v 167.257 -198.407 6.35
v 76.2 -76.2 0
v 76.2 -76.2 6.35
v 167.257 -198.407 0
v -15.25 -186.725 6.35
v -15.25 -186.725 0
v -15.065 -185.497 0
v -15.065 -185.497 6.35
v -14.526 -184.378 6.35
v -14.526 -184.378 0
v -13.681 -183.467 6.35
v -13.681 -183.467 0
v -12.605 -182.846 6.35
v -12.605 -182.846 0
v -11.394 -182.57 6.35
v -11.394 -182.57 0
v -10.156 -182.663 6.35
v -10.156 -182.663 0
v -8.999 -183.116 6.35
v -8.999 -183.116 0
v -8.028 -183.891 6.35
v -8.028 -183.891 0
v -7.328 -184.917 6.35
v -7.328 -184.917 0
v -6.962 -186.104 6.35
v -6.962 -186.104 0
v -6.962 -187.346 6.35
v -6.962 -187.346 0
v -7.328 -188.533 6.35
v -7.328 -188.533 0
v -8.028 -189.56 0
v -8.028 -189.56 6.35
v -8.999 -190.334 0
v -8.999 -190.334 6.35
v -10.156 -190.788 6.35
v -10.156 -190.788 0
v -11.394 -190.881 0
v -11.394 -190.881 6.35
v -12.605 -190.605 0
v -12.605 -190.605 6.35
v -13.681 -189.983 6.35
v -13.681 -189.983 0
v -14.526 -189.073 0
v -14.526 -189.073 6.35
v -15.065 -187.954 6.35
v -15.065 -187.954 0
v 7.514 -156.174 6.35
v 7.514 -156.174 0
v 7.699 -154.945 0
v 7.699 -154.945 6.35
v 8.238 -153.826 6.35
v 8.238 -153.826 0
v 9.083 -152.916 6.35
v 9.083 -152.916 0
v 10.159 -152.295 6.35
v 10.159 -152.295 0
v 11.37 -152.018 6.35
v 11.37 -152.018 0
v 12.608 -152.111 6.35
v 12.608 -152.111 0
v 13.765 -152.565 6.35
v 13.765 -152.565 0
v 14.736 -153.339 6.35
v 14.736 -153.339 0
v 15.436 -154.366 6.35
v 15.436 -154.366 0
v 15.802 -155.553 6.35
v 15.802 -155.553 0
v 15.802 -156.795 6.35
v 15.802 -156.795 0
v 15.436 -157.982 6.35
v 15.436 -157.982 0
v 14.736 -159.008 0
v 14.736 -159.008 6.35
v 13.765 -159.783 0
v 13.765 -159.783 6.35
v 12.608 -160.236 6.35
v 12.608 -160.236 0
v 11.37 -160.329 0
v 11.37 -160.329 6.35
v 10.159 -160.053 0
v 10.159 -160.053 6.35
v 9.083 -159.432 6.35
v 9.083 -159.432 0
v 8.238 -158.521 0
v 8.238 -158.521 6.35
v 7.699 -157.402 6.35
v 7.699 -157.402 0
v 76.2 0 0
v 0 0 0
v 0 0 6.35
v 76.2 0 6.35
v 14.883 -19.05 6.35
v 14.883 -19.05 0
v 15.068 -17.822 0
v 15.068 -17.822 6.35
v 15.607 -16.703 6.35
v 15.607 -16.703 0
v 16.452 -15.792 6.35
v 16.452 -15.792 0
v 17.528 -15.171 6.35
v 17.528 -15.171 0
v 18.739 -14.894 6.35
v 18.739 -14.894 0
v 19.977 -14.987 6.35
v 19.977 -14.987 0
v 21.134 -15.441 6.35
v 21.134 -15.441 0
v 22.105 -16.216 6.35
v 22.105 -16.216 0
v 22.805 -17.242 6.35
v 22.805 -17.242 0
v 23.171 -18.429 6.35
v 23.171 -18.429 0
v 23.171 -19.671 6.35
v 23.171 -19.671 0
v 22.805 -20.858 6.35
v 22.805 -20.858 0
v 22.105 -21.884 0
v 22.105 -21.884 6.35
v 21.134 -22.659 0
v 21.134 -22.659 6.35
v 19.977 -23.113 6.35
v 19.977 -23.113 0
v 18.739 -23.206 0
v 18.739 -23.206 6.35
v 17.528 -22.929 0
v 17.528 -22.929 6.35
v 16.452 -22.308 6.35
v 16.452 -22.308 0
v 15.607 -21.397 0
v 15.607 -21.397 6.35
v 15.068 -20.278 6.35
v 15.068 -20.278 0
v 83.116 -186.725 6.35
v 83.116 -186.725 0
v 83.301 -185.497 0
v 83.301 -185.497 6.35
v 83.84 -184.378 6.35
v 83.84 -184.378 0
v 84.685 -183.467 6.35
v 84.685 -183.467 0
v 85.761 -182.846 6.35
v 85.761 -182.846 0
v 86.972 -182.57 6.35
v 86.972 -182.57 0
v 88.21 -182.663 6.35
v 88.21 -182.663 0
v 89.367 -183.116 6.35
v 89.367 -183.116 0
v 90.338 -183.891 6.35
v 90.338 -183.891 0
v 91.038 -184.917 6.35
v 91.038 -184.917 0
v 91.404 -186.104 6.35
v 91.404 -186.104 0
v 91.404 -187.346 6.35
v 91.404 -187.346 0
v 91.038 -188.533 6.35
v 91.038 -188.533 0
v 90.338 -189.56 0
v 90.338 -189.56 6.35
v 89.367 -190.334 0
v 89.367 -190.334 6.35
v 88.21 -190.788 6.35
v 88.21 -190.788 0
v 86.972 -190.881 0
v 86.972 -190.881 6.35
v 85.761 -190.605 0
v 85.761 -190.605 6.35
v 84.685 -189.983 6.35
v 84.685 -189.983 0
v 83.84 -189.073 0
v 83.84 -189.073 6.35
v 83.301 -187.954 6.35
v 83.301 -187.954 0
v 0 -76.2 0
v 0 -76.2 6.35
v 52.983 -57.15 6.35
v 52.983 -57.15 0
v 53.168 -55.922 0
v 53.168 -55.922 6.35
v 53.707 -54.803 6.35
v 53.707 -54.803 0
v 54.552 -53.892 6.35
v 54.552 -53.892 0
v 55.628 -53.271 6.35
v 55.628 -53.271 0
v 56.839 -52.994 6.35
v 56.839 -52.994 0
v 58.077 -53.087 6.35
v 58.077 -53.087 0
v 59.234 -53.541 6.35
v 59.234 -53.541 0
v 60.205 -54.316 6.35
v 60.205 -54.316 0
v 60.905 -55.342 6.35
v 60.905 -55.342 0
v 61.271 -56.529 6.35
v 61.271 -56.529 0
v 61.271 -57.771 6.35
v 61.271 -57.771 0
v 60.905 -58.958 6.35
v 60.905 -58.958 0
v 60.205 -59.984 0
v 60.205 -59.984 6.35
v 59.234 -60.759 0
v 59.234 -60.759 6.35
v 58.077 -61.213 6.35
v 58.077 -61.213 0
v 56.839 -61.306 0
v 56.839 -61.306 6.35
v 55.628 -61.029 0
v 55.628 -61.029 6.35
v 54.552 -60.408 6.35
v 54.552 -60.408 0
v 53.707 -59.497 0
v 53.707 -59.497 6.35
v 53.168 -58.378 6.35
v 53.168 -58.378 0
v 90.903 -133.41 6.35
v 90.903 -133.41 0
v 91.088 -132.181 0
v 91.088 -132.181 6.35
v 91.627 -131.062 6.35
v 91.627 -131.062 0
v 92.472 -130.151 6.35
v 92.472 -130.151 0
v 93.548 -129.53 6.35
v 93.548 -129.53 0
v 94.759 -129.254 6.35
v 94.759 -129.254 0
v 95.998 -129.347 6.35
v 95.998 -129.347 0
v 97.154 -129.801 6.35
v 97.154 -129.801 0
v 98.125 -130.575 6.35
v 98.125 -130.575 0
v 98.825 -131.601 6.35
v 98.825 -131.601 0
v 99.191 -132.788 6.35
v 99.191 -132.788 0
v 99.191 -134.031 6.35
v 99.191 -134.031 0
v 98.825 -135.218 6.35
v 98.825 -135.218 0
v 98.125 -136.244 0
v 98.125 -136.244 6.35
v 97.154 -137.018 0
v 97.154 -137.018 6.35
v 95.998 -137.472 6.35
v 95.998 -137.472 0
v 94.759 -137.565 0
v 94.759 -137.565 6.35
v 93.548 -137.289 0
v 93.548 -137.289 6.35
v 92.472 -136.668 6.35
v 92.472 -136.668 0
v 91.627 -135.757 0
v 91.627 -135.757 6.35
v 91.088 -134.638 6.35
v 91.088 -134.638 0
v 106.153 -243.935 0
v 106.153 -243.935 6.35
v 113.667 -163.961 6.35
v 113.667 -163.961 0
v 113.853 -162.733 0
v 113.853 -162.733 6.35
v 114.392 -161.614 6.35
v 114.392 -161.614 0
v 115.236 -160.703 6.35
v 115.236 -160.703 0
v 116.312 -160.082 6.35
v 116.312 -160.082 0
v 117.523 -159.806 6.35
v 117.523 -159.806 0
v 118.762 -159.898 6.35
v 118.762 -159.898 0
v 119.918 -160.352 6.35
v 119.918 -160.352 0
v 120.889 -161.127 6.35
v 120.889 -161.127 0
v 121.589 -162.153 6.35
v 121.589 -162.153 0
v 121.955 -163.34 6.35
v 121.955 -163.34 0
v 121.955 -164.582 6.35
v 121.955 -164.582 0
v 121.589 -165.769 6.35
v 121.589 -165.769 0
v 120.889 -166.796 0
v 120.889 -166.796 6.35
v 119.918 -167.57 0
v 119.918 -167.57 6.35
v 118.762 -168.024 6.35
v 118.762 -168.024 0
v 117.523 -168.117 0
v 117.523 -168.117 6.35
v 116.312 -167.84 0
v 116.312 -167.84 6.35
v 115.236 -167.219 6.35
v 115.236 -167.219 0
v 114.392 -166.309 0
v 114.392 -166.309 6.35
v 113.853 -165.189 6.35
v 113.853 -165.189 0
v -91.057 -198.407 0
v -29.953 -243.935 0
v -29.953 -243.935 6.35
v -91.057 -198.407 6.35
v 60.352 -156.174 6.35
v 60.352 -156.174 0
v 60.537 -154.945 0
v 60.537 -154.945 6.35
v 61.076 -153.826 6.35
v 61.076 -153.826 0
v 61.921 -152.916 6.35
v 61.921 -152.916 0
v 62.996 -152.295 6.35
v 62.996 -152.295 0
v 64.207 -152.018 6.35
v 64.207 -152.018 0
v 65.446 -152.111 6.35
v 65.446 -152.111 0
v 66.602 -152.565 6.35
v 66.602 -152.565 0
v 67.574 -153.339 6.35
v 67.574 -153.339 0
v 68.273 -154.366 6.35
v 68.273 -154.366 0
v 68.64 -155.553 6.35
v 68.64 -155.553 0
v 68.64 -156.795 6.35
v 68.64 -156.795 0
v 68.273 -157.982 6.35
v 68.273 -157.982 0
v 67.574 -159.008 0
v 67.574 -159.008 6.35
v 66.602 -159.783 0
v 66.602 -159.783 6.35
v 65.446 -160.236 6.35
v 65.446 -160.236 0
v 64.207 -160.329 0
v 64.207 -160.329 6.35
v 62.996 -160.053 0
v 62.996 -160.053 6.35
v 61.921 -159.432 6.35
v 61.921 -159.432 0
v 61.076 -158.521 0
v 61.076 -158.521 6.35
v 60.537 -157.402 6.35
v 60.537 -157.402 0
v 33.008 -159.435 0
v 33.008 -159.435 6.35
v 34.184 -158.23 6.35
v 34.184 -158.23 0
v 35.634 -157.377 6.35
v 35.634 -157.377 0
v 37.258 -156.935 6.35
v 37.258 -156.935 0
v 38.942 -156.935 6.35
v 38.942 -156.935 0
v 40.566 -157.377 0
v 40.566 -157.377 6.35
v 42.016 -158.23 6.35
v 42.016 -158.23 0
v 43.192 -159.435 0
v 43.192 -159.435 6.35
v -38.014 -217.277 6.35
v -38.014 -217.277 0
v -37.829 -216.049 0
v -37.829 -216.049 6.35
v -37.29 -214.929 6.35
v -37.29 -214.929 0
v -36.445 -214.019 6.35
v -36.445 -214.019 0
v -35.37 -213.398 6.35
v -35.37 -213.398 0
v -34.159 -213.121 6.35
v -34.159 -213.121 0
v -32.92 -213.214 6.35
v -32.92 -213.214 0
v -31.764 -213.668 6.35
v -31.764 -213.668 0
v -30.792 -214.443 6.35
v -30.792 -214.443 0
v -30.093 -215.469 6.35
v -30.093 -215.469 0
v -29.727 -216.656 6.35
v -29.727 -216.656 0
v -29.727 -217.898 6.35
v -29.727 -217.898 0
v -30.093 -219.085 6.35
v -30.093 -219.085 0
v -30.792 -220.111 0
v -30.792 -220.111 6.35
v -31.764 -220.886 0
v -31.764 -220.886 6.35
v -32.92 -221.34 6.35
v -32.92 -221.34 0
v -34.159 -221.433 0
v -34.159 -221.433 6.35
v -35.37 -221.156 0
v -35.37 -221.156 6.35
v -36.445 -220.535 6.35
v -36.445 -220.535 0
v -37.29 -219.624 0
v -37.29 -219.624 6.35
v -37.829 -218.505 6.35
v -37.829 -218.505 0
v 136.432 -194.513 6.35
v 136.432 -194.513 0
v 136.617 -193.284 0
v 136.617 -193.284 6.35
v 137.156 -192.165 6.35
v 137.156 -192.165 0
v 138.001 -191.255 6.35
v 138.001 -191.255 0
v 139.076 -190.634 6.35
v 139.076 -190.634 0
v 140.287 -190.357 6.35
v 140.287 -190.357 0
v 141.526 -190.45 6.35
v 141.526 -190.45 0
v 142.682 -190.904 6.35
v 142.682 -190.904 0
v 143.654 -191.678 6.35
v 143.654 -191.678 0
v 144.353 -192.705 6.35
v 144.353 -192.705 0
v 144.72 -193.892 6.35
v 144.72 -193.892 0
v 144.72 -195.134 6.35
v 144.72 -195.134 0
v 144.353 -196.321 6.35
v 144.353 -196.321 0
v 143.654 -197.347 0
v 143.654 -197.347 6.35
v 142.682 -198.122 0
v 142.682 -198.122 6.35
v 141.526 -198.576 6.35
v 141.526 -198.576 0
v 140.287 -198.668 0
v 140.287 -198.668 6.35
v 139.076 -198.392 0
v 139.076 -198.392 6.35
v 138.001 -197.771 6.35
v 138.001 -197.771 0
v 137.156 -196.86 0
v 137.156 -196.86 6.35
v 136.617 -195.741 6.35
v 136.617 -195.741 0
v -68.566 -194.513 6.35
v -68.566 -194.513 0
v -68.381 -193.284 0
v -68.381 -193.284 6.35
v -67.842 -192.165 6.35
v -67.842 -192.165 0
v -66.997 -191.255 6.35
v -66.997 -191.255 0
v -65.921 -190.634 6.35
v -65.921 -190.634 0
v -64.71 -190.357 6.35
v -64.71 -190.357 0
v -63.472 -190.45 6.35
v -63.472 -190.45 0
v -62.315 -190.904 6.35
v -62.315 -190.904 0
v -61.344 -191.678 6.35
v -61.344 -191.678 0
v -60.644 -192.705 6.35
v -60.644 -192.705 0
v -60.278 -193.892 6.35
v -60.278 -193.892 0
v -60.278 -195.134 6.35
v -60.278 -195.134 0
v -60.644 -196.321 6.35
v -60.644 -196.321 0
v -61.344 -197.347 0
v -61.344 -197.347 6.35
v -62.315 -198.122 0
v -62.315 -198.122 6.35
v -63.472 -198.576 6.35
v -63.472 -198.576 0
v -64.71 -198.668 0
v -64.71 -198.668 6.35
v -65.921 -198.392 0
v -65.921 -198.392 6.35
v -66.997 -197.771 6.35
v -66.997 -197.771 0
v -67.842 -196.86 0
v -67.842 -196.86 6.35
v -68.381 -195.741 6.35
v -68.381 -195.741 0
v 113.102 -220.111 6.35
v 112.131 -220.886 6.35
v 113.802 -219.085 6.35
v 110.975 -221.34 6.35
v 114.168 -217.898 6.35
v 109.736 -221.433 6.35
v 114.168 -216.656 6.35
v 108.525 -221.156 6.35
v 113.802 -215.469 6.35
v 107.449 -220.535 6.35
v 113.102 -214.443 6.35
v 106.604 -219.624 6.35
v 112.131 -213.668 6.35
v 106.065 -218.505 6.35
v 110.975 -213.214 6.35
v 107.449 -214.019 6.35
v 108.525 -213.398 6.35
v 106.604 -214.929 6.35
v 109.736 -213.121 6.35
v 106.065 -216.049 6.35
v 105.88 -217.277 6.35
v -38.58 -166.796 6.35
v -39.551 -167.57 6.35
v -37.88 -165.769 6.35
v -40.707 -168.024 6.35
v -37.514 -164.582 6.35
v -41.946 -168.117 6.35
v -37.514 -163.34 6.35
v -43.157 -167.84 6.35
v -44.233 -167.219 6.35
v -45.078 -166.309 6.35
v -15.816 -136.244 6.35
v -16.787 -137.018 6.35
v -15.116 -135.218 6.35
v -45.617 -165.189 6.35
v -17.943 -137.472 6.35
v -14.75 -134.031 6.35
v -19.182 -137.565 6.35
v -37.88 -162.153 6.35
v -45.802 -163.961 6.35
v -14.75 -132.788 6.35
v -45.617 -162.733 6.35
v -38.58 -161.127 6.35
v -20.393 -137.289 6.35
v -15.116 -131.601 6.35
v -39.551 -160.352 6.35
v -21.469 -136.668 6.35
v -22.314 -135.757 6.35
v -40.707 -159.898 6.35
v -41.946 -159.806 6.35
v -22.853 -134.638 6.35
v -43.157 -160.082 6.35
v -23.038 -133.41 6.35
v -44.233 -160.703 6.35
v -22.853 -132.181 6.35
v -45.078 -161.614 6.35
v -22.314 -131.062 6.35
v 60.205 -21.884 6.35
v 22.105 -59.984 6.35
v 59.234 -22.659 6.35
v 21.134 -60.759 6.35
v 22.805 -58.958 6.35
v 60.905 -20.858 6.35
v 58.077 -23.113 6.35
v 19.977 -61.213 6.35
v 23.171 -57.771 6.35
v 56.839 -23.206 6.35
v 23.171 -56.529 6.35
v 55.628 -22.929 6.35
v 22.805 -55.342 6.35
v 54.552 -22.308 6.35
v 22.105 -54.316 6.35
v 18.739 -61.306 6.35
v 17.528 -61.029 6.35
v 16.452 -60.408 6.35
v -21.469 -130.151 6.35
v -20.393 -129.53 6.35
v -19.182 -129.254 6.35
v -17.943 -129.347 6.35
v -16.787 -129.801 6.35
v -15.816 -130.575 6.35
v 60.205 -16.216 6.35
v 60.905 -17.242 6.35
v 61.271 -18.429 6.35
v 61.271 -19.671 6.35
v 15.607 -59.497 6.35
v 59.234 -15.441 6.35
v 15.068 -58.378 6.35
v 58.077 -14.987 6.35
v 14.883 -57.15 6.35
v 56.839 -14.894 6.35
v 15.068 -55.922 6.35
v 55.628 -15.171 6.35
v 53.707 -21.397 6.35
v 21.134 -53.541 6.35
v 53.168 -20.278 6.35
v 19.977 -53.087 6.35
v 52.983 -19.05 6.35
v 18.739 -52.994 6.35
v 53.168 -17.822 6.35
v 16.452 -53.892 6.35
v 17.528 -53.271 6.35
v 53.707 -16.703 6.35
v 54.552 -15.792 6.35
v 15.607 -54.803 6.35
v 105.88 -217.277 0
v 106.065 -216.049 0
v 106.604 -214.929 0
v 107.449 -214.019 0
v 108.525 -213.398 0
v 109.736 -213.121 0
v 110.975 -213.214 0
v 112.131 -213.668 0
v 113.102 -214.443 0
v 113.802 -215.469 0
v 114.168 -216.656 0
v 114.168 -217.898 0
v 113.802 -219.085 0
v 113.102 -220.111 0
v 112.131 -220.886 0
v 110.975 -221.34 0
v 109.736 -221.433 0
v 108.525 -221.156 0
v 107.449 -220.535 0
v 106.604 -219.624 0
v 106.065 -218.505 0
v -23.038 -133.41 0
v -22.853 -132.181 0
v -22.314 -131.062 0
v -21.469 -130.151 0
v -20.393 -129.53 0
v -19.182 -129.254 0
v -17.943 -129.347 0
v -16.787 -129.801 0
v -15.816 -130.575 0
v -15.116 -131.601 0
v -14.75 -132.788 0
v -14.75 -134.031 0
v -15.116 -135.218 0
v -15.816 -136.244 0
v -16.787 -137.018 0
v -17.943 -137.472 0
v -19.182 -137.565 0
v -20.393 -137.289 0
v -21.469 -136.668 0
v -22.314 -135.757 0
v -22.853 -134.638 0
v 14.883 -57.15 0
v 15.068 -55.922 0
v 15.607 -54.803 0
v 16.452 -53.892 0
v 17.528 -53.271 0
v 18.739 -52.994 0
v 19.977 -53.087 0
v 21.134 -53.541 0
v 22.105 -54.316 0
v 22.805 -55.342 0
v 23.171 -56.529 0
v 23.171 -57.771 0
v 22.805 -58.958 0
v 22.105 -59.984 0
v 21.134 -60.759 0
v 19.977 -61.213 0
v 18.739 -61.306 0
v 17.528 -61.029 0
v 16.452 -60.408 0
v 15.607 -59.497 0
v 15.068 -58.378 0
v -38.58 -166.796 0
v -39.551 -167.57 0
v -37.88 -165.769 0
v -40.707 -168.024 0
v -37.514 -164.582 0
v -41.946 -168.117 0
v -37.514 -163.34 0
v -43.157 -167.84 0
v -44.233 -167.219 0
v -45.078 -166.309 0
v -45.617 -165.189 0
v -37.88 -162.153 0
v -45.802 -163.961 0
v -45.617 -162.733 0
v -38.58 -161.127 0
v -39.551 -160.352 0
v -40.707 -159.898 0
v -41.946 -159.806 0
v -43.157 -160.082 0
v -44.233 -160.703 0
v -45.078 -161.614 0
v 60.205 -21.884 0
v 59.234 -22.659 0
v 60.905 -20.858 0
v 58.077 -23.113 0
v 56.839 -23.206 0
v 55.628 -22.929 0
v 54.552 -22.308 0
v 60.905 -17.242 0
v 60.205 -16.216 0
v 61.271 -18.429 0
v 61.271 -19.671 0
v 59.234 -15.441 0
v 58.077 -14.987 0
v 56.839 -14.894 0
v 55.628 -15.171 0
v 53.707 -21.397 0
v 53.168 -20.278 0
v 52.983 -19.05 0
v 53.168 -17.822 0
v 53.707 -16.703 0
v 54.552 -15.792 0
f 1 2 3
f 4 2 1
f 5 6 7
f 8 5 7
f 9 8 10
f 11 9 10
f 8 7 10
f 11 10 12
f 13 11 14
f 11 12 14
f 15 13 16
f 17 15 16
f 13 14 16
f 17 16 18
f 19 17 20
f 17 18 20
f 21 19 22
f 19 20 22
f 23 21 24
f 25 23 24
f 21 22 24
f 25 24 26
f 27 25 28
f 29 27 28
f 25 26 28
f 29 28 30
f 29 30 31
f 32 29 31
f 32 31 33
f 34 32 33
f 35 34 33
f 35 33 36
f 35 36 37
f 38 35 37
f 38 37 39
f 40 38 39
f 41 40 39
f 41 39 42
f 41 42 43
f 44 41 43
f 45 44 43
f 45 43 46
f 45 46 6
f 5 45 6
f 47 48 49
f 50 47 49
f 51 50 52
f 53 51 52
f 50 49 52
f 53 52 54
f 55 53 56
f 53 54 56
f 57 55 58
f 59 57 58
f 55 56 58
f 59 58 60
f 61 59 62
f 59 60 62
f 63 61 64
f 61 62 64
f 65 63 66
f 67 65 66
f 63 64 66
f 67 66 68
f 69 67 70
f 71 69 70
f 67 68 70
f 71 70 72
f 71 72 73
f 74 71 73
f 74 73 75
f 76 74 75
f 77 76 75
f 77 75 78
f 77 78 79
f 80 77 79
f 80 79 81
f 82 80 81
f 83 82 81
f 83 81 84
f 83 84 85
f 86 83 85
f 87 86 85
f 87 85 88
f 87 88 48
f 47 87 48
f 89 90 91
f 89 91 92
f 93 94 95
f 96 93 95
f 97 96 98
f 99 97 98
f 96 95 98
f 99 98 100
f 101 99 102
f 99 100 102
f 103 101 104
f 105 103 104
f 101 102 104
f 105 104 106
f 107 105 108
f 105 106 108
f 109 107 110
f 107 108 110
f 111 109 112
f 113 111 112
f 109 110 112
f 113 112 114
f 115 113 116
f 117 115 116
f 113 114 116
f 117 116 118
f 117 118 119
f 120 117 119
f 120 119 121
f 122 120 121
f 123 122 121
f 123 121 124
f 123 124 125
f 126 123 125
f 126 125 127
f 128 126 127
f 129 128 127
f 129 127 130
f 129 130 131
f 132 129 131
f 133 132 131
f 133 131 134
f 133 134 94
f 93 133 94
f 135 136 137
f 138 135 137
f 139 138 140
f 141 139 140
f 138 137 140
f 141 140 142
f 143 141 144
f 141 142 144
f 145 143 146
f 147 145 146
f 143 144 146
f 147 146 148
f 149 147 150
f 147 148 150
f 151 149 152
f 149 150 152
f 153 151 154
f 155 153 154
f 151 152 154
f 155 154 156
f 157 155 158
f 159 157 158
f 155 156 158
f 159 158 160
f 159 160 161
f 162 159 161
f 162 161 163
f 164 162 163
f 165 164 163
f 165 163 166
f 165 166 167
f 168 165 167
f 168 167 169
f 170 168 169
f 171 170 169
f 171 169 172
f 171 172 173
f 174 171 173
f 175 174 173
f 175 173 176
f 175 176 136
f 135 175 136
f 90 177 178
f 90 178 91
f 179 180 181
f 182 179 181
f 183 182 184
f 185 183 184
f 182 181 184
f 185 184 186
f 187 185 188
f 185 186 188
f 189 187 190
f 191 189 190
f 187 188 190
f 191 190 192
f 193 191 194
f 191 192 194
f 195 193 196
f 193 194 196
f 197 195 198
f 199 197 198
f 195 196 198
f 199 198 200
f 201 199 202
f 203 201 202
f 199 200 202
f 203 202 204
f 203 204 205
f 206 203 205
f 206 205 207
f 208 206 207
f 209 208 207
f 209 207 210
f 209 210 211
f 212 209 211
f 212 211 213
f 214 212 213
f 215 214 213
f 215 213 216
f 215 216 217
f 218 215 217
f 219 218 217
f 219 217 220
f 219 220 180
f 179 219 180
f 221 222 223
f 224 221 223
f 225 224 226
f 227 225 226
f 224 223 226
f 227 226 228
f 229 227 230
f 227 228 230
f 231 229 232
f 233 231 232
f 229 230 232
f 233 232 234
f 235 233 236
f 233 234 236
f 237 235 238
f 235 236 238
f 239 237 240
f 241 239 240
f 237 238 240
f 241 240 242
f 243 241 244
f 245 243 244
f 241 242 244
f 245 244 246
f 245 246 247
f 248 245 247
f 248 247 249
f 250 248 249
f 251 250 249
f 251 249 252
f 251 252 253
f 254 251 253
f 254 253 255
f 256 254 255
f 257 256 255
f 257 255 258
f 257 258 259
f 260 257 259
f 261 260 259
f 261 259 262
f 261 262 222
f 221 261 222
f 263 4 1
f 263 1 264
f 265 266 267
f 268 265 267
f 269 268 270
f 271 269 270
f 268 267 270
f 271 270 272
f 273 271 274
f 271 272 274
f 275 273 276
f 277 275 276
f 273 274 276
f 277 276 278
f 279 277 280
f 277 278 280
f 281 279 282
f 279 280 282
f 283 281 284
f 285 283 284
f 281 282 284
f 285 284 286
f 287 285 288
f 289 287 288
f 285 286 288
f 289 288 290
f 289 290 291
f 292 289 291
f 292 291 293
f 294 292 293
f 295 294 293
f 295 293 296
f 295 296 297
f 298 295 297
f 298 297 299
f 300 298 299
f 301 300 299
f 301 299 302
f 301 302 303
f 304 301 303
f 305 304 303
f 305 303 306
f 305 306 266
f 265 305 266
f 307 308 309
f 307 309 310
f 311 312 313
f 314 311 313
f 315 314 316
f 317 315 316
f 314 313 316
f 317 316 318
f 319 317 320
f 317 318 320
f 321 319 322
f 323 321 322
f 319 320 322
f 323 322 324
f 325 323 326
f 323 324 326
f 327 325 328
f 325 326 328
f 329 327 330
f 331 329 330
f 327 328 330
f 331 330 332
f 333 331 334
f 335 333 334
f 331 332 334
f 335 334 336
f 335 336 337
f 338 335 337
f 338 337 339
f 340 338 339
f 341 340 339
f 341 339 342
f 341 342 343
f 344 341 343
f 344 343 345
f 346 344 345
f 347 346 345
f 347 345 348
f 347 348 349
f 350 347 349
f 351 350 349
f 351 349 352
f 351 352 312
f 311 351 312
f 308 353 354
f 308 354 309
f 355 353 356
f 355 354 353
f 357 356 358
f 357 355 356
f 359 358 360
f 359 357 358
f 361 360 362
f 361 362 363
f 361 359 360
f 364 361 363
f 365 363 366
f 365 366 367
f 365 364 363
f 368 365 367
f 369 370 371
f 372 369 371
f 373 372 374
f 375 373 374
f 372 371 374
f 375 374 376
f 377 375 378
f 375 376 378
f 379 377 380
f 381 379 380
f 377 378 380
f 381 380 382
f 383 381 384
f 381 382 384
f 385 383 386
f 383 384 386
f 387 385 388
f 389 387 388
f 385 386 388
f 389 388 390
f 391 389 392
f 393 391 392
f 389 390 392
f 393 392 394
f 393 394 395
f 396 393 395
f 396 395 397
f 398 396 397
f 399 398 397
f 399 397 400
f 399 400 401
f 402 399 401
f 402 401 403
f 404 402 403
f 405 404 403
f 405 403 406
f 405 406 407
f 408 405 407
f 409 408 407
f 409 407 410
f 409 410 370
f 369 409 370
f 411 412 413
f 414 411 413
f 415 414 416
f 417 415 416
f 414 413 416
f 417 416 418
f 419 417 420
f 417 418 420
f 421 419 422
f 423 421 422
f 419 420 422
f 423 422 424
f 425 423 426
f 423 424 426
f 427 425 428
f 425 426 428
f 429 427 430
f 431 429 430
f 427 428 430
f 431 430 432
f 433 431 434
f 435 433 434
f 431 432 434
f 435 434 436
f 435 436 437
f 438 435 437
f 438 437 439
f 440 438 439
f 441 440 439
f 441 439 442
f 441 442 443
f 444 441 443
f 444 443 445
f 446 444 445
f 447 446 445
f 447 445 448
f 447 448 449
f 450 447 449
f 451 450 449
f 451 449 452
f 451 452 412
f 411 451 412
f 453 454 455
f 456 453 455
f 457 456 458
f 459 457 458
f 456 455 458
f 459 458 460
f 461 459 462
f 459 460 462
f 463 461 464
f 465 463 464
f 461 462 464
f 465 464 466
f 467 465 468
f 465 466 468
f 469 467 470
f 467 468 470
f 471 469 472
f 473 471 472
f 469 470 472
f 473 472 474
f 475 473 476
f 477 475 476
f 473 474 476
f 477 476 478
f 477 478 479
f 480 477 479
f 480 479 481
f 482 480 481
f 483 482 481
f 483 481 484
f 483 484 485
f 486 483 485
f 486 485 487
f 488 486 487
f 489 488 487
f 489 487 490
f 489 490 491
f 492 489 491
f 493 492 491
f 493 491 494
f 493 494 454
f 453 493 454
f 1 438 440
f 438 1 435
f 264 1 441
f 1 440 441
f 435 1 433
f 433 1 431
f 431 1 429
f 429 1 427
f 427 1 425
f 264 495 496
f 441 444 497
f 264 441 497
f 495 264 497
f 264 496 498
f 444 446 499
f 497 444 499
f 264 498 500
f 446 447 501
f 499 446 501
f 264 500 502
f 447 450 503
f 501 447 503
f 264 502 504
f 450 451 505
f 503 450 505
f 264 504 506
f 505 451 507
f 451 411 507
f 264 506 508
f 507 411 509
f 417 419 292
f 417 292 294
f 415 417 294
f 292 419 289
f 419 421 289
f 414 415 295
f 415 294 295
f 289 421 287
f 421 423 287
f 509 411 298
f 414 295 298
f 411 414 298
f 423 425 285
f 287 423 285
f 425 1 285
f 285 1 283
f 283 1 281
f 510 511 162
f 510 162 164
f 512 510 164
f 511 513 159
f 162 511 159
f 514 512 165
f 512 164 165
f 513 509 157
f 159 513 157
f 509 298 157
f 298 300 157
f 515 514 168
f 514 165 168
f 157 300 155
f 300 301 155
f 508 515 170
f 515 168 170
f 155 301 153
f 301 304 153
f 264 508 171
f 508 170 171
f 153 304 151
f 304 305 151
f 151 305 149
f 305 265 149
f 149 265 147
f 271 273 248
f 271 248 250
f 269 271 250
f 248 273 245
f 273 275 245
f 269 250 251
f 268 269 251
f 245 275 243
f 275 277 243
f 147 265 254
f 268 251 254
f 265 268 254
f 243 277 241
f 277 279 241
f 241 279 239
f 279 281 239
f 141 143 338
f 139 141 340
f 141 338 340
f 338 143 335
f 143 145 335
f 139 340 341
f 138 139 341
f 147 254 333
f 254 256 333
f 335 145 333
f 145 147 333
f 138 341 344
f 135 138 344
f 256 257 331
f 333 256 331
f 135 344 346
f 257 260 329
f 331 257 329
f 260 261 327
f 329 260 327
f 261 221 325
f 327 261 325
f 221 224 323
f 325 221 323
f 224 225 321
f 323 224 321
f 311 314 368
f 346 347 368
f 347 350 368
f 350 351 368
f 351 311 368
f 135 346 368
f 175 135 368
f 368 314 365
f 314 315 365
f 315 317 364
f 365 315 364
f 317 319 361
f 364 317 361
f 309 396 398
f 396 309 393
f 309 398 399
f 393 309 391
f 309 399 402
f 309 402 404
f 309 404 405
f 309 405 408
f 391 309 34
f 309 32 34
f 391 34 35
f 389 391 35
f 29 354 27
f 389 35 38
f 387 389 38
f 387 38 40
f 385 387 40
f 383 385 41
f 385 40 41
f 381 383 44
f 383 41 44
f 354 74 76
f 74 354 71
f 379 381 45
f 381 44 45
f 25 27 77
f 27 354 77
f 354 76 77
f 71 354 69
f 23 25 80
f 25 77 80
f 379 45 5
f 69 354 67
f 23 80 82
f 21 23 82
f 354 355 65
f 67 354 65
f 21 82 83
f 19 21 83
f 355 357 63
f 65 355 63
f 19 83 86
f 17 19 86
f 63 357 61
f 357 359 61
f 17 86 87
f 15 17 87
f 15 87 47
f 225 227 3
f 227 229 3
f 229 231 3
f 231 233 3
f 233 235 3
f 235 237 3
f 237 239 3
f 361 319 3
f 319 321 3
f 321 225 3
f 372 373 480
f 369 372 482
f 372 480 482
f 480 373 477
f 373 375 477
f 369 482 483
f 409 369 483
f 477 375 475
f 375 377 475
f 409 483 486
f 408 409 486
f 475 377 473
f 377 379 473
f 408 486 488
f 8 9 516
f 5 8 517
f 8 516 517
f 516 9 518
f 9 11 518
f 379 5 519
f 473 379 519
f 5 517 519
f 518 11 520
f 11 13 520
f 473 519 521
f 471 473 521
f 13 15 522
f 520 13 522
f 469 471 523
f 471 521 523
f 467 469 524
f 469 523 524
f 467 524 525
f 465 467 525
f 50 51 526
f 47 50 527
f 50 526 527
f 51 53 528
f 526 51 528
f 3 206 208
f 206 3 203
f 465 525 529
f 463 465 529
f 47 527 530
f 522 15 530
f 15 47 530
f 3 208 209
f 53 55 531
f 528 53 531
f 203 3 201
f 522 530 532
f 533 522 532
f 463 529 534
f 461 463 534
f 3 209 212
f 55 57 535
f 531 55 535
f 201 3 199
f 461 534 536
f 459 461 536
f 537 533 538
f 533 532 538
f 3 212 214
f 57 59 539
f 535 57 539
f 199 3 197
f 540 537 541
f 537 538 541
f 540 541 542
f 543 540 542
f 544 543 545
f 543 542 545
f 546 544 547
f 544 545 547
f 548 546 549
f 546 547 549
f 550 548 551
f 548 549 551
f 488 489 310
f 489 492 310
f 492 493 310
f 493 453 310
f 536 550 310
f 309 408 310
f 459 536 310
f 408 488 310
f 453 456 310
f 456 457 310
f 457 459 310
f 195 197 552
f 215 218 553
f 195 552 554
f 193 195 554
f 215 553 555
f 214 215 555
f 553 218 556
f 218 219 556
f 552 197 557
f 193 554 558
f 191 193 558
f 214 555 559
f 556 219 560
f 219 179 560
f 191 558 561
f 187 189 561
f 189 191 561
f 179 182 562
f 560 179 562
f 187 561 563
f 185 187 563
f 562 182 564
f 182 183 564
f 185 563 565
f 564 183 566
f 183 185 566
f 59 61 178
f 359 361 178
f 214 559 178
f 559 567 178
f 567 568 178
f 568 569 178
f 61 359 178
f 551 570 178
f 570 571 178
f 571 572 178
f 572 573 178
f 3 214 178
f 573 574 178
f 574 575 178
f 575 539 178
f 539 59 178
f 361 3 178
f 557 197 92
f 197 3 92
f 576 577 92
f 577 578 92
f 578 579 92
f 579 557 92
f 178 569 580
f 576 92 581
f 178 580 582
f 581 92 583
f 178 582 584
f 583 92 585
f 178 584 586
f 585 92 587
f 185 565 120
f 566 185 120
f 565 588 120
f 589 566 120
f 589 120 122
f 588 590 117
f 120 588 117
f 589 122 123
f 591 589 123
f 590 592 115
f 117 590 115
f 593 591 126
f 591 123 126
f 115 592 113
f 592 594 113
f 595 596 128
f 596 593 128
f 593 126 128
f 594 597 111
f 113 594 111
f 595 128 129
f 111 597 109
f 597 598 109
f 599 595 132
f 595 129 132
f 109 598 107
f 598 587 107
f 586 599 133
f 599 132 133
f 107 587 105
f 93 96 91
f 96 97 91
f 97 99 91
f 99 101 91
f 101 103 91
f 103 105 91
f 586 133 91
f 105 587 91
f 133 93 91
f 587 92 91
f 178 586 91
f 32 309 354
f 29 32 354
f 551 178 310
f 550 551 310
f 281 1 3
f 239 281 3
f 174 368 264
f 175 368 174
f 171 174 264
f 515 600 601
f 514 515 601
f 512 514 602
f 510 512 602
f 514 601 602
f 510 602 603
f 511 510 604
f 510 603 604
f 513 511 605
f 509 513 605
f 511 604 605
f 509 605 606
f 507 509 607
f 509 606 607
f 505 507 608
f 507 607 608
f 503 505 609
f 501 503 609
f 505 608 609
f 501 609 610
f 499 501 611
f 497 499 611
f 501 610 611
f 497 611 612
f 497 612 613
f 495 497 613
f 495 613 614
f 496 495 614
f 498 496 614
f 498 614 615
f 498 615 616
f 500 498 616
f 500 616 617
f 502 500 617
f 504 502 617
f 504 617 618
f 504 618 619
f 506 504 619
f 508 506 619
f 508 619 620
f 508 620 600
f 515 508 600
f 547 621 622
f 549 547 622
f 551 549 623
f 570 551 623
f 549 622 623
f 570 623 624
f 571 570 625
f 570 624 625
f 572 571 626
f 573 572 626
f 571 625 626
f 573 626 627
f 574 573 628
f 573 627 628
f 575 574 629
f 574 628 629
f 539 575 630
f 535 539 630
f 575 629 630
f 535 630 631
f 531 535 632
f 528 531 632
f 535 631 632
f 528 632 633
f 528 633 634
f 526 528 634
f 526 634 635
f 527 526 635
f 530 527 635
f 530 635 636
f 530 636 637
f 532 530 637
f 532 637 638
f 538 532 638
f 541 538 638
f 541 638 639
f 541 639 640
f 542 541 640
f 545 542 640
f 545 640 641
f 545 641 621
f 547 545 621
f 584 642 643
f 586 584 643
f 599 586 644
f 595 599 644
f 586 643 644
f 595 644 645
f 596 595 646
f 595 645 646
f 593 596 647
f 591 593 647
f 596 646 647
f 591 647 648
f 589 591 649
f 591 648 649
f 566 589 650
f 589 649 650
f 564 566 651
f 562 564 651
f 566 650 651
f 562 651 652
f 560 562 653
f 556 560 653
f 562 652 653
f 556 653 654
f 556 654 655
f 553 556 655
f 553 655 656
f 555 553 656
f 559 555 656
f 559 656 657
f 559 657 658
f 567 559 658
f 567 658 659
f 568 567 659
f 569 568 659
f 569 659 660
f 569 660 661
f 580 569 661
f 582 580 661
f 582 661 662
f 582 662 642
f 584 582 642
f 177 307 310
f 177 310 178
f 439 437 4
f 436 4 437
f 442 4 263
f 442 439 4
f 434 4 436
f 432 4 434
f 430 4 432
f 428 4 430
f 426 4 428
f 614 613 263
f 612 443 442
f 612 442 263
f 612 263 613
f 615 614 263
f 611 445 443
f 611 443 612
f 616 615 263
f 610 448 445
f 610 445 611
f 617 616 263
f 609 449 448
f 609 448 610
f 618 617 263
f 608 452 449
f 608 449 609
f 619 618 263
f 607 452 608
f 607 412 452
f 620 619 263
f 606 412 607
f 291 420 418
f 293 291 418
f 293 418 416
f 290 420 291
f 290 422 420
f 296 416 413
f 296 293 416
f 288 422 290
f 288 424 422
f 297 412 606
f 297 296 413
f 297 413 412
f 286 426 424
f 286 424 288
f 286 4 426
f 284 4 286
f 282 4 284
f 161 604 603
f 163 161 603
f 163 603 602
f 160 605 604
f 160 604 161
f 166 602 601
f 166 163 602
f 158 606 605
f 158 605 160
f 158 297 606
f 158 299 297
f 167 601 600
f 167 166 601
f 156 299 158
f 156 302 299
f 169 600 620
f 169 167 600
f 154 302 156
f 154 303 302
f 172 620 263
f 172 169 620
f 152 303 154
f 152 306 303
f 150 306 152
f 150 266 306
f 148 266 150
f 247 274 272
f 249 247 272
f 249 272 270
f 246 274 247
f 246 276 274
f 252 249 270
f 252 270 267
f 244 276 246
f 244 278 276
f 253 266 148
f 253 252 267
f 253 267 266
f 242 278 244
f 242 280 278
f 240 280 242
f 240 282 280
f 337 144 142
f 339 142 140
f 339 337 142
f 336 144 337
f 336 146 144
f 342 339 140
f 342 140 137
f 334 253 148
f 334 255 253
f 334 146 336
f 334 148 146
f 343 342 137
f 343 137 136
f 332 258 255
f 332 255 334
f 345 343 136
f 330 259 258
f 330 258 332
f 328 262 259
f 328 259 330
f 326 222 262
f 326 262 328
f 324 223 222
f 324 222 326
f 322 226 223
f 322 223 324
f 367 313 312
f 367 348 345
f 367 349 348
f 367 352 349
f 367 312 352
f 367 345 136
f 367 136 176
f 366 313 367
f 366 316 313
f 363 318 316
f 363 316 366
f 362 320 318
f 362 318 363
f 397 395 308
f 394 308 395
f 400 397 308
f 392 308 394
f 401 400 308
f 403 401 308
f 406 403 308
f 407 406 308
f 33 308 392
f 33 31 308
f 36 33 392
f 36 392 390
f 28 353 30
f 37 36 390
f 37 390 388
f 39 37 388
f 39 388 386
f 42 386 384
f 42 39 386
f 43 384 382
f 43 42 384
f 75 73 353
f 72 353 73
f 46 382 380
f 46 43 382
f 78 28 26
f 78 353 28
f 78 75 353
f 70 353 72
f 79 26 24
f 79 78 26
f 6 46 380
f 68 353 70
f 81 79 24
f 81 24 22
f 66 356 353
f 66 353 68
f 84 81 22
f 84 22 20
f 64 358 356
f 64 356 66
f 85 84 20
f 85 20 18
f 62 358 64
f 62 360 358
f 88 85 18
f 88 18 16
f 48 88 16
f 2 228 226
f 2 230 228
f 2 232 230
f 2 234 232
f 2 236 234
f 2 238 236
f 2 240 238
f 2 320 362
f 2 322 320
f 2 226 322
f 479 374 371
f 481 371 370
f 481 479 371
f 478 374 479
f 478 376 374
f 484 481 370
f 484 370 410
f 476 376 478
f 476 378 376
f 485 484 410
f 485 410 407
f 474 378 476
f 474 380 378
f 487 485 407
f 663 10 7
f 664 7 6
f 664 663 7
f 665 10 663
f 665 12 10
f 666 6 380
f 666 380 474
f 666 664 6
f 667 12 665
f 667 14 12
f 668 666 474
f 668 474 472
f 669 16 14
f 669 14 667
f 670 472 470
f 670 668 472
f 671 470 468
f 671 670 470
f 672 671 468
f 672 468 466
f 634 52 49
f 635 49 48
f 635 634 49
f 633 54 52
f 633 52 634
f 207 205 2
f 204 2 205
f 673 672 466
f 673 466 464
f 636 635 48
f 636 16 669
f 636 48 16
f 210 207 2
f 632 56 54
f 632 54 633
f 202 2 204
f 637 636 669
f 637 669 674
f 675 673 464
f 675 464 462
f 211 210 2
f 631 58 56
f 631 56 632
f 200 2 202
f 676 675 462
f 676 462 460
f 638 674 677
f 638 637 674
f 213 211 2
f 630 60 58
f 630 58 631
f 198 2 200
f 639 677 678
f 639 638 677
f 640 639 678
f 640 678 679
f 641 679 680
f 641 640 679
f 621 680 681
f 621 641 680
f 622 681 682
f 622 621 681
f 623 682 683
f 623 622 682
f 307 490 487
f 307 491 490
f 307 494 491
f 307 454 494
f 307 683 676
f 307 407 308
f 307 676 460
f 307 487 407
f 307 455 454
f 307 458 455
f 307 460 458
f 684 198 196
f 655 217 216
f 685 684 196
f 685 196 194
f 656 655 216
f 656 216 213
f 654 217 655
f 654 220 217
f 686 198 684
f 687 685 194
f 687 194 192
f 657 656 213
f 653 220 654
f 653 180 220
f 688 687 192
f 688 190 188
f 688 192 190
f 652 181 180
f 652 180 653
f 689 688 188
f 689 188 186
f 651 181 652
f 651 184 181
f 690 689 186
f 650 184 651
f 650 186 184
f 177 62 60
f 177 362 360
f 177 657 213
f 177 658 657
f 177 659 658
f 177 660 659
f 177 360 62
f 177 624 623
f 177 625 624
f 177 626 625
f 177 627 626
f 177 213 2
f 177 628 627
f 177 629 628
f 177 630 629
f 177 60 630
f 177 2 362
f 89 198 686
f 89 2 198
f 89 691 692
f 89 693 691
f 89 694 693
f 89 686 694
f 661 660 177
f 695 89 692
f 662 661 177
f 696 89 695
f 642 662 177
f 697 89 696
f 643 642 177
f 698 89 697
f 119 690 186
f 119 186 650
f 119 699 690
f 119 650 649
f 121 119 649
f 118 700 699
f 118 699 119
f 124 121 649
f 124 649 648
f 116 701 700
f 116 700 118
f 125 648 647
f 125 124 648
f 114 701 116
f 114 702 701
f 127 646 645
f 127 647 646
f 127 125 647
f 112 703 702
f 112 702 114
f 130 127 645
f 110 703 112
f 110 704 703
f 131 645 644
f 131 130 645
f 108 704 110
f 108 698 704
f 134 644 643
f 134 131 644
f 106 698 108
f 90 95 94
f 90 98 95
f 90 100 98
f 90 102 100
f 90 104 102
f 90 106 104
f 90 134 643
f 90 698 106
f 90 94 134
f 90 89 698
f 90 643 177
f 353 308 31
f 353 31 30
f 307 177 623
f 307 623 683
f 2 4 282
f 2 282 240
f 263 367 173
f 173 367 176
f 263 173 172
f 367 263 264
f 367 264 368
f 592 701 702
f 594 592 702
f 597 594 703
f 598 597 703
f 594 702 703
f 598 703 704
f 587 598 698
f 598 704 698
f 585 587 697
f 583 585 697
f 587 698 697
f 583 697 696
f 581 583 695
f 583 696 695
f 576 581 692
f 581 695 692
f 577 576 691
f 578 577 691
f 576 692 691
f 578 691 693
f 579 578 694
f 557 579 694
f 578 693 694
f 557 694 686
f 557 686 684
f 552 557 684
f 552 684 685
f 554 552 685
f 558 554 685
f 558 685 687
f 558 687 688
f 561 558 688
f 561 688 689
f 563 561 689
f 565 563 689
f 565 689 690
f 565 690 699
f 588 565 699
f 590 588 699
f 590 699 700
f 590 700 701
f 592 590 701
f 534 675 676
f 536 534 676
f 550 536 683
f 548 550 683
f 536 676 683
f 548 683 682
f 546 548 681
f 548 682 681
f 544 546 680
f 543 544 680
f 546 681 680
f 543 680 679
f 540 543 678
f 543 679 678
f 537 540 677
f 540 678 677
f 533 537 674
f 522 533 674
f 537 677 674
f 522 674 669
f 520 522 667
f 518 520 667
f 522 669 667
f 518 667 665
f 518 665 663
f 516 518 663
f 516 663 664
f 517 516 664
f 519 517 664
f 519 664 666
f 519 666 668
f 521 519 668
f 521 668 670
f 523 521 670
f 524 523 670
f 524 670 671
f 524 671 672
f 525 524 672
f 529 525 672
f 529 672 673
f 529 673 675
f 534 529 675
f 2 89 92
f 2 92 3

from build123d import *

# Parameters (mm, degrees)
BOSS_EXTRUDE1_DEPTH              = 6.35
F_21_64_0_32813_DIAMETER_HOLE1_D = 8.334502
LPATTERN1_COUNT                  = 2
LPATTERN1_PITCH                  = 38.1
LPATTERN1_COUNT_DIR2             = 2
LPATTERN1_PITCH_DIR2             = 38.1
F_21_64_0_32813_DIAMETER_HOLE2_D = 8.334502
LPATTERN2_COUNT                  = 2
LPATTERN2_PITCH                  = 38.1
LPATTERN2_COUNT_DIR2             = 3
LPATTERN2_PITCH_DIR2             = 38.1
F_21_64_0_32813_DIAMETER_HOLE3_D = 8.334502
LPATTERN3_COUNT                  = 2
LPATTERN3_PITCH                  = 38.1
LPATTERN3_COUNT_DIR2             = 3
LPATTERN3_PITCH_DIR2             = 38.1
FILLET1_R                        = 6.35


with BuildPart() as part:
    # Sketch1 → Boss-Extrude1 (new body)
    with BuildSketch(Plane.XY):
        Polygon((0, 0), (76.2, 0), (76.2, -76.2), (167.256744728, -198.406502444), (106.153493506, -243.934874808), (38.1, -152.600845184), (-29.953493506, -243.934874808), (-91.056744728, -198.406502444), (0, -76.2), align=None)
    extrude(amount=BOSS_EXTRUDE1_DEPTH)

    # 21/64 (0.32813) Diameter Hole1 (through all)
    with Locations(Plane.XY.offset(6.35)):
        with Locations((57.15, -19.05)):
            f_21_64_0_32813_diameter_hole1 = Hole(F_21_64_0_32813_DIAMETER_HOLE1_D / 2)

    # LPattern1: 21_64 _0.32813_ Diameter Hole1 2 × 2
    with Locations(*[(-i * LPATTERN1_PITCH, -j * LPATTERN1_PITCH_DIR2, 0) for i in range(LPATTERN1_COUNT) for j in range(LPATTERN1_COUNT_DIR2) if (i, j) != (0, 0)]):
        add(f_21_64_0_32813_diameter_hole1, mode=Mode.SUBTRACT)

    # 21/64 (0.32813) Diameter Hole2 (through all)
    with Locations(Plane.XY.offset(6.35)):
        with Locations((-64.398838831, -194.512782729)):
            f_21_64_0_32813_diameter_hole2 = Hole(F_21_64_0_32813_DIAMETER_HOLE2_D / 2)

    # LPattern2: 21_64 _0.32813_ Diameter Hole2 2 × 3
    with Locations(*[Vector(0.8018799372965569, -0.5974852016253374, 0) * (i * LPATTERN2_PITCH) + Vector(0.5974852016253378, 0.8018799372965567, 0) * (j * LPATTERN2_PITCH_DIR2) for i in range(LPATTERN2_COUNT) for j in range(LPATTERN2_COUNT_DIR2) if (i, j) != (0, 0)]):
        add(f_21_64_0_32813_diameter_hole2, mode=Mode.SUBTRACT)

    # 21/64 (0.32813) Diameter Hole3 (through all)
    with Locations(Plane.XY.offset(6.35)):
        with Locations((140.598838831, -194.512782729)):
            f_21_64_0_32813_diameter_hole3 = Hole(F_21_64_0_32813_DIAMETER_HOLE3_D / 2)

    # LPattern3: 21_64 _0.32813_ Diameter Hole3 2 × 3
    with Locations(*[Vector(-0.8018799372965564, -0.597485201625338, 0) * (i * LPATTERN3_PITCH) + Vector(-0.5974852016253386, 0.8018799372965559, 0) * (j * LPATTERN3_PITCH_DIR2) for i in range(LPATTERN3_COUNT) for j in range(LPATTERN3_COUNT_DIR2) if (i, j) != (0, 0)]):
        add(f_21_64_0_32813_diameter_hole3, mode=Mode.SUBTRACT)

    # Fillet1
    fillet1_edges = [part.edges().sort_by_distance(p)[0] for p in [
        (38.1, -152.600845184, 3.175),
    ]]
    fillet(fillet1_edges, radius=FILLET1_R)


solid = part.part
